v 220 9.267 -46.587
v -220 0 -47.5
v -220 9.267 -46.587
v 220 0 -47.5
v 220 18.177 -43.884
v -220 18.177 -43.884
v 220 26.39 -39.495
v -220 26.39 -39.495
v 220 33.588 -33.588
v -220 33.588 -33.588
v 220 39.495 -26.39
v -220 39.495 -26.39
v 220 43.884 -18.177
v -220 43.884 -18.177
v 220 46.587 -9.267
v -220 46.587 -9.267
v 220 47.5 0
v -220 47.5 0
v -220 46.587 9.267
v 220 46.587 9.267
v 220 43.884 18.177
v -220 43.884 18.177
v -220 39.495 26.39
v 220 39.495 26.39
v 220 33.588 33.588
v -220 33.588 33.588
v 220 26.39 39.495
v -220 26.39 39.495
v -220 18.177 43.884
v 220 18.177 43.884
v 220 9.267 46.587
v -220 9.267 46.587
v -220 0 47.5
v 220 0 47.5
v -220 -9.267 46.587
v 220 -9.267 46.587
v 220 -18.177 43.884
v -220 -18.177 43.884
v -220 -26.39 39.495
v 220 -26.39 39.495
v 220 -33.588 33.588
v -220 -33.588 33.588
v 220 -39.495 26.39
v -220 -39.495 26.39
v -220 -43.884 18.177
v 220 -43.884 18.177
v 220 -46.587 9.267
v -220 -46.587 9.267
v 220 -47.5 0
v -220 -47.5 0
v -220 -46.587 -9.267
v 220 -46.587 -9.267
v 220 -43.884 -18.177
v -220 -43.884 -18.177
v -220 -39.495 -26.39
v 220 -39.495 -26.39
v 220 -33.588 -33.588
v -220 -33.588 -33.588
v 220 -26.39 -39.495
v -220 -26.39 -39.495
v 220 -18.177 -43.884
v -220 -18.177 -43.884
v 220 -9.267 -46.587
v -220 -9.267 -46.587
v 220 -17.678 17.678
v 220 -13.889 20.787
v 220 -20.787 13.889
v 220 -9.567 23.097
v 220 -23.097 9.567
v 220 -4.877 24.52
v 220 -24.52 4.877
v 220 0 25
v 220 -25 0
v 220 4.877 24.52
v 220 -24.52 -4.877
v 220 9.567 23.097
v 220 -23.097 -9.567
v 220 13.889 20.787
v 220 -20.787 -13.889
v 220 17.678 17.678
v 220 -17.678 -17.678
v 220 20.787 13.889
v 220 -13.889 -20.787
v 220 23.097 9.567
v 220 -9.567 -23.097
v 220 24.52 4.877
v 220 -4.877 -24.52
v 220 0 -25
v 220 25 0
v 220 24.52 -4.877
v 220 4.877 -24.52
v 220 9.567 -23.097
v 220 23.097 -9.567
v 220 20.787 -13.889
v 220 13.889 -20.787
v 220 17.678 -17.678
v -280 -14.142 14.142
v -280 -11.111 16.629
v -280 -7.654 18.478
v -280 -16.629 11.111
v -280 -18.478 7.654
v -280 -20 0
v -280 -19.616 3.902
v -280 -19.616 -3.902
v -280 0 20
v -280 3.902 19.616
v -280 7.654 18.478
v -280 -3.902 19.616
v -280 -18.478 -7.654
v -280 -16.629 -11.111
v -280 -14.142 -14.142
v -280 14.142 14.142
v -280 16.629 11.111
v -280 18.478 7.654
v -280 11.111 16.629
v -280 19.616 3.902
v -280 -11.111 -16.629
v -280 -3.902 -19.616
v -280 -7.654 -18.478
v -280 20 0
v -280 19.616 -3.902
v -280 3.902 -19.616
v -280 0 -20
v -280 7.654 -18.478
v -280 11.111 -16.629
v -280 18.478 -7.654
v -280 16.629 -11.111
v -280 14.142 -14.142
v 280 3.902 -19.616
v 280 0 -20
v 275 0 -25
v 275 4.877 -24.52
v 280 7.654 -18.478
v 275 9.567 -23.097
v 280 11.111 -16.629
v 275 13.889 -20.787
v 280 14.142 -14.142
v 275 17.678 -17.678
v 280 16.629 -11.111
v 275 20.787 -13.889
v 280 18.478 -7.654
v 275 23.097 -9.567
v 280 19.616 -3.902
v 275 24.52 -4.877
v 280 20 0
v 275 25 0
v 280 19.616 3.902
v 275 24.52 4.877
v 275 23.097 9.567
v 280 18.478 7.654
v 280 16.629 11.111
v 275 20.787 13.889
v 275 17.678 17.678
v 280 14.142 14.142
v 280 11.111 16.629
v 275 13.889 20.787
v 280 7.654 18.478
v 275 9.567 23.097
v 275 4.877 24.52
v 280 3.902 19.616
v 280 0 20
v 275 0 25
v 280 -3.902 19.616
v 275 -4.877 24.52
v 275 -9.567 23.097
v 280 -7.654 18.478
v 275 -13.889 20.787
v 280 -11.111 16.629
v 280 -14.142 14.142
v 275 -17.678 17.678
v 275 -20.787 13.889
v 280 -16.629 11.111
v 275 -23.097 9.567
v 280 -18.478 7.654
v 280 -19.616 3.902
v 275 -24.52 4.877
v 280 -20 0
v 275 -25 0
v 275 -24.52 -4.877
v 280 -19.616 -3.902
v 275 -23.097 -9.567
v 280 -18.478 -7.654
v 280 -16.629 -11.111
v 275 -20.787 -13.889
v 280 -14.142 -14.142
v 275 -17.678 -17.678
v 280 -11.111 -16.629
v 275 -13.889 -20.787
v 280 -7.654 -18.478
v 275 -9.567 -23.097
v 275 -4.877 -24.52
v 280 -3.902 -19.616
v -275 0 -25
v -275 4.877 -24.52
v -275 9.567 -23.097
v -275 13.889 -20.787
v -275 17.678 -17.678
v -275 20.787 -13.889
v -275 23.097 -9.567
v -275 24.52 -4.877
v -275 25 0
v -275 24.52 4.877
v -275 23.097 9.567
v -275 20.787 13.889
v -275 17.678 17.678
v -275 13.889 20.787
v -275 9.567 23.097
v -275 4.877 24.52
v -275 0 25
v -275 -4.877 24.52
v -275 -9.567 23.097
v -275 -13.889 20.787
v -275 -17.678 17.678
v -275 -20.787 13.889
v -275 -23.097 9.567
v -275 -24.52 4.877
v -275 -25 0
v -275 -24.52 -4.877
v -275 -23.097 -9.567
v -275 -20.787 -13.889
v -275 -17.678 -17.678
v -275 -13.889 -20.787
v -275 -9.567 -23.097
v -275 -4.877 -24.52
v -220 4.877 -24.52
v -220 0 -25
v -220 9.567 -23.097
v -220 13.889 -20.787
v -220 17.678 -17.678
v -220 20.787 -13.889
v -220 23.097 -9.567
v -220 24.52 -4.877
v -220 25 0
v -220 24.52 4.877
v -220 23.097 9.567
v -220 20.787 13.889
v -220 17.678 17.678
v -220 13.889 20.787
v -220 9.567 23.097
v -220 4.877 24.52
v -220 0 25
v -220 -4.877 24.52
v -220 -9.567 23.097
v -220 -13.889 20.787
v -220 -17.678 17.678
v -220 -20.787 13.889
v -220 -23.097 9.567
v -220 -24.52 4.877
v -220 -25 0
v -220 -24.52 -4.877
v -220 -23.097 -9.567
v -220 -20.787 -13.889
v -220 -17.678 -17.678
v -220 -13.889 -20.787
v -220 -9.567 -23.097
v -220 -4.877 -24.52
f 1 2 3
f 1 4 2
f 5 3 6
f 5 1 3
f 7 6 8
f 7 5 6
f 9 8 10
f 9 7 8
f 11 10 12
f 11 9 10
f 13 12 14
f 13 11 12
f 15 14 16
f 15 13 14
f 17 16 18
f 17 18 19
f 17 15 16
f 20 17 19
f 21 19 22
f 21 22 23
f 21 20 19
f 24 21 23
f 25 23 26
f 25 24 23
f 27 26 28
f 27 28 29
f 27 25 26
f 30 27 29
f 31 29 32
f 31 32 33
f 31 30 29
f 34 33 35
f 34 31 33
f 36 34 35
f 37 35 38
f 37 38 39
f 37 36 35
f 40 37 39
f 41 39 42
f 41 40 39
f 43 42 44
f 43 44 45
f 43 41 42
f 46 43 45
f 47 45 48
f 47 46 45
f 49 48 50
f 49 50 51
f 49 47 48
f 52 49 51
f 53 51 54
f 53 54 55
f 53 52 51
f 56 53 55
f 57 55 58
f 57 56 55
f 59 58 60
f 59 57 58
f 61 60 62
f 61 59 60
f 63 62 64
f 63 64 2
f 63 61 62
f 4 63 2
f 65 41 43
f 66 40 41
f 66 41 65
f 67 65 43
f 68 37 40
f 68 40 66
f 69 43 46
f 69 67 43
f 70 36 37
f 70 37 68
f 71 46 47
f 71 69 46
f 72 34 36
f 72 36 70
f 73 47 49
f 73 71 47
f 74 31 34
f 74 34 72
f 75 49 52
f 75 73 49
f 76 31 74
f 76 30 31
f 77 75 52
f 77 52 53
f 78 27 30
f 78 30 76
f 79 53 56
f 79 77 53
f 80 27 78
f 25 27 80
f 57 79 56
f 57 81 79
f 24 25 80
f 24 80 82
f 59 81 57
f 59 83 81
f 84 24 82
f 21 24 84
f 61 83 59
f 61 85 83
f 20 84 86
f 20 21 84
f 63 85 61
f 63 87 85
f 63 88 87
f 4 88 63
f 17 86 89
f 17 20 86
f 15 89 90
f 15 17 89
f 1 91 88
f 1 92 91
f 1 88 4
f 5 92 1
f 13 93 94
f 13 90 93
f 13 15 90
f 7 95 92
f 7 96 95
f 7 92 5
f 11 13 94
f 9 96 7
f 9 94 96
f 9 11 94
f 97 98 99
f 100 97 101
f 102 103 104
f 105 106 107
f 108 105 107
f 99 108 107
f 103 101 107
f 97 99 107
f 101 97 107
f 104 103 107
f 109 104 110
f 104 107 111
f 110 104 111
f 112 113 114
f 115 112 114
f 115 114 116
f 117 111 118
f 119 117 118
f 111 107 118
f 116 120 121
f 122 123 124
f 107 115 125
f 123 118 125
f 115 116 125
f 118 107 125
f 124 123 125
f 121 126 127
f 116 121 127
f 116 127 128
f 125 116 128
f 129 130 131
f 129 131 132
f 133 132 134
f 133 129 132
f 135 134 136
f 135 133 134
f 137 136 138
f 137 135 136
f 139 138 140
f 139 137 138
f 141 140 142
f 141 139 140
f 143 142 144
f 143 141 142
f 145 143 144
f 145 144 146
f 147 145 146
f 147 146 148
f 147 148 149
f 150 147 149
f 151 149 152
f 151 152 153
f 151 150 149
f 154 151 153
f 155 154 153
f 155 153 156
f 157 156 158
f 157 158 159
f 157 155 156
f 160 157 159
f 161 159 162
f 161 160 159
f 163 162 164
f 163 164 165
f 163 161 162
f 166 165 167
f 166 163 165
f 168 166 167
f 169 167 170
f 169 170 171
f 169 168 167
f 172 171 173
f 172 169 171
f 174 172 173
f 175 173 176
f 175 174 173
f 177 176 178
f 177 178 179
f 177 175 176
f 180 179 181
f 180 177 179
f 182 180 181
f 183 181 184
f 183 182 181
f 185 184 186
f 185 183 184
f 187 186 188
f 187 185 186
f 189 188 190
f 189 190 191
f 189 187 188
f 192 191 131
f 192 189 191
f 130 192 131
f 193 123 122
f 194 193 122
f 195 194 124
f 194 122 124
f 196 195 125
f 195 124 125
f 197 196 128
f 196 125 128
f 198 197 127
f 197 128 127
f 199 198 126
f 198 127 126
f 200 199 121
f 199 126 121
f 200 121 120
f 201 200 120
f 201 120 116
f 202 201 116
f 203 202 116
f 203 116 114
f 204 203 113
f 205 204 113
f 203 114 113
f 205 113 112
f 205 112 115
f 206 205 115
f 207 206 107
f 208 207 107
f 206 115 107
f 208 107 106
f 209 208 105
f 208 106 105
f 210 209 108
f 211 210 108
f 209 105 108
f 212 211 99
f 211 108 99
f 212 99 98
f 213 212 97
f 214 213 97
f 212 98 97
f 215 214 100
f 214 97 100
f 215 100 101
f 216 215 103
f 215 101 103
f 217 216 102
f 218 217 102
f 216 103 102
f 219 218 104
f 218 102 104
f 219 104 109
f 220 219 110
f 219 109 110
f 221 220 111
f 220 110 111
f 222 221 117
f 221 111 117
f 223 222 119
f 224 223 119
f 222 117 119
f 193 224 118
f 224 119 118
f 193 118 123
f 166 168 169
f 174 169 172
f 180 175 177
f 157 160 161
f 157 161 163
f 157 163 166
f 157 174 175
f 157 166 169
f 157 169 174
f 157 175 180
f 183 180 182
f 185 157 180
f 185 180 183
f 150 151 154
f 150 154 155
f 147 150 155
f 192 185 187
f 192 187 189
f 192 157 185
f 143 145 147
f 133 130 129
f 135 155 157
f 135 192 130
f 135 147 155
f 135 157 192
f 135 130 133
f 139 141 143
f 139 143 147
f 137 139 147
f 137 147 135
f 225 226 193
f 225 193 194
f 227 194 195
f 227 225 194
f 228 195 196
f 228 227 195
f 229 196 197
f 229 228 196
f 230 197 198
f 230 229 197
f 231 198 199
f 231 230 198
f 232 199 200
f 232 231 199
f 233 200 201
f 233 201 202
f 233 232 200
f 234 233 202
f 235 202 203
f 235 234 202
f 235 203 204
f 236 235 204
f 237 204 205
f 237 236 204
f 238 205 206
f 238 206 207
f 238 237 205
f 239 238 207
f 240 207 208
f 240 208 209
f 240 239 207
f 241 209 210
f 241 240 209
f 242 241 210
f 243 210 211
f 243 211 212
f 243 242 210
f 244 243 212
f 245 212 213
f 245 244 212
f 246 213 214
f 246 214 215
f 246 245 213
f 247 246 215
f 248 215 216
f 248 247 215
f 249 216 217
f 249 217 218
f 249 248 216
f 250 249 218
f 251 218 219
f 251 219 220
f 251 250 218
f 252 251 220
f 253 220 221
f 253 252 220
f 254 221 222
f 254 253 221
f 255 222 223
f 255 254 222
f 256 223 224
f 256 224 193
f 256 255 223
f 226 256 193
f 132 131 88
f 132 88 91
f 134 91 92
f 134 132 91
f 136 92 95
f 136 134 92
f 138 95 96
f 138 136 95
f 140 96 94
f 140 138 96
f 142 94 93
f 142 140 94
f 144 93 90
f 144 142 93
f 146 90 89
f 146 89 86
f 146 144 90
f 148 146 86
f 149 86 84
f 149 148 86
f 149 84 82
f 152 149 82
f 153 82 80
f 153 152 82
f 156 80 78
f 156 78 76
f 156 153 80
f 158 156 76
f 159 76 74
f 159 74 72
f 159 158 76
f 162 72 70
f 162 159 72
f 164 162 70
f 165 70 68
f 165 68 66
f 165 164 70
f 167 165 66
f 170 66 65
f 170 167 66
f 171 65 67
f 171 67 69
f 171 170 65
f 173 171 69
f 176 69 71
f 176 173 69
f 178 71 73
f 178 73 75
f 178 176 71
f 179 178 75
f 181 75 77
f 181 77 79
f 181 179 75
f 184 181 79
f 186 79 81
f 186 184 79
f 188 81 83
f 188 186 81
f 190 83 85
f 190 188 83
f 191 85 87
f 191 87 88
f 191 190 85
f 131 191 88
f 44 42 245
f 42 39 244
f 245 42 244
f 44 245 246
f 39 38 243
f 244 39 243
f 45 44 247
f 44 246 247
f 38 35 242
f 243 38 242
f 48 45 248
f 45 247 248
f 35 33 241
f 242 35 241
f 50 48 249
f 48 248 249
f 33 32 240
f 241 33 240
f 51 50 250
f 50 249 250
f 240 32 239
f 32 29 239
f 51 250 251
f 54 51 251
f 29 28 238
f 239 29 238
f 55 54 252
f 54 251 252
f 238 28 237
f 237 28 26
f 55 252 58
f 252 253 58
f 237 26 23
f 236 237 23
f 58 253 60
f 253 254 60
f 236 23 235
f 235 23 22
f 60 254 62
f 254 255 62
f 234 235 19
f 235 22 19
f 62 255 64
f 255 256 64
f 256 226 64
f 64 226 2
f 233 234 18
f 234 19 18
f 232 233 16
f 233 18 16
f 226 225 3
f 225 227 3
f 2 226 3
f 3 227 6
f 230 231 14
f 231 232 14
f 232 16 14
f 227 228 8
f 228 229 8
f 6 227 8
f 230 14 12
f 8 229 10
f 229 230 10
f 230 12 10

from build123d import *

# Parameters (mm, degrees)
SKETCH1_R           = 47.5
BOSS_EXTRUDE1_DEPTH = 220
SKETCH2_R           = 25
BOSS_EXTRUDE2_DEPTH = 280
CHAMFER1_SIZE       = 5


with BuildPart() as part:
    # Sketch1 → Boss-Extrude1 (new body, symmetric)
    with BuildSketch(Plane(origin=(0, 0, 0), x_dir=(0, 0, -1), z_dir=(1, 0, 0))):
        Circle(SKETCH1_R)
    extrude(amount=BOSS_EXTRUDE1_DEPTH, both=True)

    # Sketch2 → Boss-Extrude2 (add, symmetric)
    with BuildSketch(Plane(origin=(0, 0, 0), x_dir=(0, 0, -1), z_dir=(1, 0, 0))):
        Circle(SKETCH2_R)
    extrude(amount=BOSS_EXTRUDE2_DEPTH, both=True)

    # Chamfer1
    chamfer1_edges = [part.edges().sort_by_distance(p)[0] for p in [
        (-280, 0, 25),
        (280, 0, 25),
    ]]
    chamfer(chamfer1_edges, length=CHAMFER1_SIZE)


solid = part.part
